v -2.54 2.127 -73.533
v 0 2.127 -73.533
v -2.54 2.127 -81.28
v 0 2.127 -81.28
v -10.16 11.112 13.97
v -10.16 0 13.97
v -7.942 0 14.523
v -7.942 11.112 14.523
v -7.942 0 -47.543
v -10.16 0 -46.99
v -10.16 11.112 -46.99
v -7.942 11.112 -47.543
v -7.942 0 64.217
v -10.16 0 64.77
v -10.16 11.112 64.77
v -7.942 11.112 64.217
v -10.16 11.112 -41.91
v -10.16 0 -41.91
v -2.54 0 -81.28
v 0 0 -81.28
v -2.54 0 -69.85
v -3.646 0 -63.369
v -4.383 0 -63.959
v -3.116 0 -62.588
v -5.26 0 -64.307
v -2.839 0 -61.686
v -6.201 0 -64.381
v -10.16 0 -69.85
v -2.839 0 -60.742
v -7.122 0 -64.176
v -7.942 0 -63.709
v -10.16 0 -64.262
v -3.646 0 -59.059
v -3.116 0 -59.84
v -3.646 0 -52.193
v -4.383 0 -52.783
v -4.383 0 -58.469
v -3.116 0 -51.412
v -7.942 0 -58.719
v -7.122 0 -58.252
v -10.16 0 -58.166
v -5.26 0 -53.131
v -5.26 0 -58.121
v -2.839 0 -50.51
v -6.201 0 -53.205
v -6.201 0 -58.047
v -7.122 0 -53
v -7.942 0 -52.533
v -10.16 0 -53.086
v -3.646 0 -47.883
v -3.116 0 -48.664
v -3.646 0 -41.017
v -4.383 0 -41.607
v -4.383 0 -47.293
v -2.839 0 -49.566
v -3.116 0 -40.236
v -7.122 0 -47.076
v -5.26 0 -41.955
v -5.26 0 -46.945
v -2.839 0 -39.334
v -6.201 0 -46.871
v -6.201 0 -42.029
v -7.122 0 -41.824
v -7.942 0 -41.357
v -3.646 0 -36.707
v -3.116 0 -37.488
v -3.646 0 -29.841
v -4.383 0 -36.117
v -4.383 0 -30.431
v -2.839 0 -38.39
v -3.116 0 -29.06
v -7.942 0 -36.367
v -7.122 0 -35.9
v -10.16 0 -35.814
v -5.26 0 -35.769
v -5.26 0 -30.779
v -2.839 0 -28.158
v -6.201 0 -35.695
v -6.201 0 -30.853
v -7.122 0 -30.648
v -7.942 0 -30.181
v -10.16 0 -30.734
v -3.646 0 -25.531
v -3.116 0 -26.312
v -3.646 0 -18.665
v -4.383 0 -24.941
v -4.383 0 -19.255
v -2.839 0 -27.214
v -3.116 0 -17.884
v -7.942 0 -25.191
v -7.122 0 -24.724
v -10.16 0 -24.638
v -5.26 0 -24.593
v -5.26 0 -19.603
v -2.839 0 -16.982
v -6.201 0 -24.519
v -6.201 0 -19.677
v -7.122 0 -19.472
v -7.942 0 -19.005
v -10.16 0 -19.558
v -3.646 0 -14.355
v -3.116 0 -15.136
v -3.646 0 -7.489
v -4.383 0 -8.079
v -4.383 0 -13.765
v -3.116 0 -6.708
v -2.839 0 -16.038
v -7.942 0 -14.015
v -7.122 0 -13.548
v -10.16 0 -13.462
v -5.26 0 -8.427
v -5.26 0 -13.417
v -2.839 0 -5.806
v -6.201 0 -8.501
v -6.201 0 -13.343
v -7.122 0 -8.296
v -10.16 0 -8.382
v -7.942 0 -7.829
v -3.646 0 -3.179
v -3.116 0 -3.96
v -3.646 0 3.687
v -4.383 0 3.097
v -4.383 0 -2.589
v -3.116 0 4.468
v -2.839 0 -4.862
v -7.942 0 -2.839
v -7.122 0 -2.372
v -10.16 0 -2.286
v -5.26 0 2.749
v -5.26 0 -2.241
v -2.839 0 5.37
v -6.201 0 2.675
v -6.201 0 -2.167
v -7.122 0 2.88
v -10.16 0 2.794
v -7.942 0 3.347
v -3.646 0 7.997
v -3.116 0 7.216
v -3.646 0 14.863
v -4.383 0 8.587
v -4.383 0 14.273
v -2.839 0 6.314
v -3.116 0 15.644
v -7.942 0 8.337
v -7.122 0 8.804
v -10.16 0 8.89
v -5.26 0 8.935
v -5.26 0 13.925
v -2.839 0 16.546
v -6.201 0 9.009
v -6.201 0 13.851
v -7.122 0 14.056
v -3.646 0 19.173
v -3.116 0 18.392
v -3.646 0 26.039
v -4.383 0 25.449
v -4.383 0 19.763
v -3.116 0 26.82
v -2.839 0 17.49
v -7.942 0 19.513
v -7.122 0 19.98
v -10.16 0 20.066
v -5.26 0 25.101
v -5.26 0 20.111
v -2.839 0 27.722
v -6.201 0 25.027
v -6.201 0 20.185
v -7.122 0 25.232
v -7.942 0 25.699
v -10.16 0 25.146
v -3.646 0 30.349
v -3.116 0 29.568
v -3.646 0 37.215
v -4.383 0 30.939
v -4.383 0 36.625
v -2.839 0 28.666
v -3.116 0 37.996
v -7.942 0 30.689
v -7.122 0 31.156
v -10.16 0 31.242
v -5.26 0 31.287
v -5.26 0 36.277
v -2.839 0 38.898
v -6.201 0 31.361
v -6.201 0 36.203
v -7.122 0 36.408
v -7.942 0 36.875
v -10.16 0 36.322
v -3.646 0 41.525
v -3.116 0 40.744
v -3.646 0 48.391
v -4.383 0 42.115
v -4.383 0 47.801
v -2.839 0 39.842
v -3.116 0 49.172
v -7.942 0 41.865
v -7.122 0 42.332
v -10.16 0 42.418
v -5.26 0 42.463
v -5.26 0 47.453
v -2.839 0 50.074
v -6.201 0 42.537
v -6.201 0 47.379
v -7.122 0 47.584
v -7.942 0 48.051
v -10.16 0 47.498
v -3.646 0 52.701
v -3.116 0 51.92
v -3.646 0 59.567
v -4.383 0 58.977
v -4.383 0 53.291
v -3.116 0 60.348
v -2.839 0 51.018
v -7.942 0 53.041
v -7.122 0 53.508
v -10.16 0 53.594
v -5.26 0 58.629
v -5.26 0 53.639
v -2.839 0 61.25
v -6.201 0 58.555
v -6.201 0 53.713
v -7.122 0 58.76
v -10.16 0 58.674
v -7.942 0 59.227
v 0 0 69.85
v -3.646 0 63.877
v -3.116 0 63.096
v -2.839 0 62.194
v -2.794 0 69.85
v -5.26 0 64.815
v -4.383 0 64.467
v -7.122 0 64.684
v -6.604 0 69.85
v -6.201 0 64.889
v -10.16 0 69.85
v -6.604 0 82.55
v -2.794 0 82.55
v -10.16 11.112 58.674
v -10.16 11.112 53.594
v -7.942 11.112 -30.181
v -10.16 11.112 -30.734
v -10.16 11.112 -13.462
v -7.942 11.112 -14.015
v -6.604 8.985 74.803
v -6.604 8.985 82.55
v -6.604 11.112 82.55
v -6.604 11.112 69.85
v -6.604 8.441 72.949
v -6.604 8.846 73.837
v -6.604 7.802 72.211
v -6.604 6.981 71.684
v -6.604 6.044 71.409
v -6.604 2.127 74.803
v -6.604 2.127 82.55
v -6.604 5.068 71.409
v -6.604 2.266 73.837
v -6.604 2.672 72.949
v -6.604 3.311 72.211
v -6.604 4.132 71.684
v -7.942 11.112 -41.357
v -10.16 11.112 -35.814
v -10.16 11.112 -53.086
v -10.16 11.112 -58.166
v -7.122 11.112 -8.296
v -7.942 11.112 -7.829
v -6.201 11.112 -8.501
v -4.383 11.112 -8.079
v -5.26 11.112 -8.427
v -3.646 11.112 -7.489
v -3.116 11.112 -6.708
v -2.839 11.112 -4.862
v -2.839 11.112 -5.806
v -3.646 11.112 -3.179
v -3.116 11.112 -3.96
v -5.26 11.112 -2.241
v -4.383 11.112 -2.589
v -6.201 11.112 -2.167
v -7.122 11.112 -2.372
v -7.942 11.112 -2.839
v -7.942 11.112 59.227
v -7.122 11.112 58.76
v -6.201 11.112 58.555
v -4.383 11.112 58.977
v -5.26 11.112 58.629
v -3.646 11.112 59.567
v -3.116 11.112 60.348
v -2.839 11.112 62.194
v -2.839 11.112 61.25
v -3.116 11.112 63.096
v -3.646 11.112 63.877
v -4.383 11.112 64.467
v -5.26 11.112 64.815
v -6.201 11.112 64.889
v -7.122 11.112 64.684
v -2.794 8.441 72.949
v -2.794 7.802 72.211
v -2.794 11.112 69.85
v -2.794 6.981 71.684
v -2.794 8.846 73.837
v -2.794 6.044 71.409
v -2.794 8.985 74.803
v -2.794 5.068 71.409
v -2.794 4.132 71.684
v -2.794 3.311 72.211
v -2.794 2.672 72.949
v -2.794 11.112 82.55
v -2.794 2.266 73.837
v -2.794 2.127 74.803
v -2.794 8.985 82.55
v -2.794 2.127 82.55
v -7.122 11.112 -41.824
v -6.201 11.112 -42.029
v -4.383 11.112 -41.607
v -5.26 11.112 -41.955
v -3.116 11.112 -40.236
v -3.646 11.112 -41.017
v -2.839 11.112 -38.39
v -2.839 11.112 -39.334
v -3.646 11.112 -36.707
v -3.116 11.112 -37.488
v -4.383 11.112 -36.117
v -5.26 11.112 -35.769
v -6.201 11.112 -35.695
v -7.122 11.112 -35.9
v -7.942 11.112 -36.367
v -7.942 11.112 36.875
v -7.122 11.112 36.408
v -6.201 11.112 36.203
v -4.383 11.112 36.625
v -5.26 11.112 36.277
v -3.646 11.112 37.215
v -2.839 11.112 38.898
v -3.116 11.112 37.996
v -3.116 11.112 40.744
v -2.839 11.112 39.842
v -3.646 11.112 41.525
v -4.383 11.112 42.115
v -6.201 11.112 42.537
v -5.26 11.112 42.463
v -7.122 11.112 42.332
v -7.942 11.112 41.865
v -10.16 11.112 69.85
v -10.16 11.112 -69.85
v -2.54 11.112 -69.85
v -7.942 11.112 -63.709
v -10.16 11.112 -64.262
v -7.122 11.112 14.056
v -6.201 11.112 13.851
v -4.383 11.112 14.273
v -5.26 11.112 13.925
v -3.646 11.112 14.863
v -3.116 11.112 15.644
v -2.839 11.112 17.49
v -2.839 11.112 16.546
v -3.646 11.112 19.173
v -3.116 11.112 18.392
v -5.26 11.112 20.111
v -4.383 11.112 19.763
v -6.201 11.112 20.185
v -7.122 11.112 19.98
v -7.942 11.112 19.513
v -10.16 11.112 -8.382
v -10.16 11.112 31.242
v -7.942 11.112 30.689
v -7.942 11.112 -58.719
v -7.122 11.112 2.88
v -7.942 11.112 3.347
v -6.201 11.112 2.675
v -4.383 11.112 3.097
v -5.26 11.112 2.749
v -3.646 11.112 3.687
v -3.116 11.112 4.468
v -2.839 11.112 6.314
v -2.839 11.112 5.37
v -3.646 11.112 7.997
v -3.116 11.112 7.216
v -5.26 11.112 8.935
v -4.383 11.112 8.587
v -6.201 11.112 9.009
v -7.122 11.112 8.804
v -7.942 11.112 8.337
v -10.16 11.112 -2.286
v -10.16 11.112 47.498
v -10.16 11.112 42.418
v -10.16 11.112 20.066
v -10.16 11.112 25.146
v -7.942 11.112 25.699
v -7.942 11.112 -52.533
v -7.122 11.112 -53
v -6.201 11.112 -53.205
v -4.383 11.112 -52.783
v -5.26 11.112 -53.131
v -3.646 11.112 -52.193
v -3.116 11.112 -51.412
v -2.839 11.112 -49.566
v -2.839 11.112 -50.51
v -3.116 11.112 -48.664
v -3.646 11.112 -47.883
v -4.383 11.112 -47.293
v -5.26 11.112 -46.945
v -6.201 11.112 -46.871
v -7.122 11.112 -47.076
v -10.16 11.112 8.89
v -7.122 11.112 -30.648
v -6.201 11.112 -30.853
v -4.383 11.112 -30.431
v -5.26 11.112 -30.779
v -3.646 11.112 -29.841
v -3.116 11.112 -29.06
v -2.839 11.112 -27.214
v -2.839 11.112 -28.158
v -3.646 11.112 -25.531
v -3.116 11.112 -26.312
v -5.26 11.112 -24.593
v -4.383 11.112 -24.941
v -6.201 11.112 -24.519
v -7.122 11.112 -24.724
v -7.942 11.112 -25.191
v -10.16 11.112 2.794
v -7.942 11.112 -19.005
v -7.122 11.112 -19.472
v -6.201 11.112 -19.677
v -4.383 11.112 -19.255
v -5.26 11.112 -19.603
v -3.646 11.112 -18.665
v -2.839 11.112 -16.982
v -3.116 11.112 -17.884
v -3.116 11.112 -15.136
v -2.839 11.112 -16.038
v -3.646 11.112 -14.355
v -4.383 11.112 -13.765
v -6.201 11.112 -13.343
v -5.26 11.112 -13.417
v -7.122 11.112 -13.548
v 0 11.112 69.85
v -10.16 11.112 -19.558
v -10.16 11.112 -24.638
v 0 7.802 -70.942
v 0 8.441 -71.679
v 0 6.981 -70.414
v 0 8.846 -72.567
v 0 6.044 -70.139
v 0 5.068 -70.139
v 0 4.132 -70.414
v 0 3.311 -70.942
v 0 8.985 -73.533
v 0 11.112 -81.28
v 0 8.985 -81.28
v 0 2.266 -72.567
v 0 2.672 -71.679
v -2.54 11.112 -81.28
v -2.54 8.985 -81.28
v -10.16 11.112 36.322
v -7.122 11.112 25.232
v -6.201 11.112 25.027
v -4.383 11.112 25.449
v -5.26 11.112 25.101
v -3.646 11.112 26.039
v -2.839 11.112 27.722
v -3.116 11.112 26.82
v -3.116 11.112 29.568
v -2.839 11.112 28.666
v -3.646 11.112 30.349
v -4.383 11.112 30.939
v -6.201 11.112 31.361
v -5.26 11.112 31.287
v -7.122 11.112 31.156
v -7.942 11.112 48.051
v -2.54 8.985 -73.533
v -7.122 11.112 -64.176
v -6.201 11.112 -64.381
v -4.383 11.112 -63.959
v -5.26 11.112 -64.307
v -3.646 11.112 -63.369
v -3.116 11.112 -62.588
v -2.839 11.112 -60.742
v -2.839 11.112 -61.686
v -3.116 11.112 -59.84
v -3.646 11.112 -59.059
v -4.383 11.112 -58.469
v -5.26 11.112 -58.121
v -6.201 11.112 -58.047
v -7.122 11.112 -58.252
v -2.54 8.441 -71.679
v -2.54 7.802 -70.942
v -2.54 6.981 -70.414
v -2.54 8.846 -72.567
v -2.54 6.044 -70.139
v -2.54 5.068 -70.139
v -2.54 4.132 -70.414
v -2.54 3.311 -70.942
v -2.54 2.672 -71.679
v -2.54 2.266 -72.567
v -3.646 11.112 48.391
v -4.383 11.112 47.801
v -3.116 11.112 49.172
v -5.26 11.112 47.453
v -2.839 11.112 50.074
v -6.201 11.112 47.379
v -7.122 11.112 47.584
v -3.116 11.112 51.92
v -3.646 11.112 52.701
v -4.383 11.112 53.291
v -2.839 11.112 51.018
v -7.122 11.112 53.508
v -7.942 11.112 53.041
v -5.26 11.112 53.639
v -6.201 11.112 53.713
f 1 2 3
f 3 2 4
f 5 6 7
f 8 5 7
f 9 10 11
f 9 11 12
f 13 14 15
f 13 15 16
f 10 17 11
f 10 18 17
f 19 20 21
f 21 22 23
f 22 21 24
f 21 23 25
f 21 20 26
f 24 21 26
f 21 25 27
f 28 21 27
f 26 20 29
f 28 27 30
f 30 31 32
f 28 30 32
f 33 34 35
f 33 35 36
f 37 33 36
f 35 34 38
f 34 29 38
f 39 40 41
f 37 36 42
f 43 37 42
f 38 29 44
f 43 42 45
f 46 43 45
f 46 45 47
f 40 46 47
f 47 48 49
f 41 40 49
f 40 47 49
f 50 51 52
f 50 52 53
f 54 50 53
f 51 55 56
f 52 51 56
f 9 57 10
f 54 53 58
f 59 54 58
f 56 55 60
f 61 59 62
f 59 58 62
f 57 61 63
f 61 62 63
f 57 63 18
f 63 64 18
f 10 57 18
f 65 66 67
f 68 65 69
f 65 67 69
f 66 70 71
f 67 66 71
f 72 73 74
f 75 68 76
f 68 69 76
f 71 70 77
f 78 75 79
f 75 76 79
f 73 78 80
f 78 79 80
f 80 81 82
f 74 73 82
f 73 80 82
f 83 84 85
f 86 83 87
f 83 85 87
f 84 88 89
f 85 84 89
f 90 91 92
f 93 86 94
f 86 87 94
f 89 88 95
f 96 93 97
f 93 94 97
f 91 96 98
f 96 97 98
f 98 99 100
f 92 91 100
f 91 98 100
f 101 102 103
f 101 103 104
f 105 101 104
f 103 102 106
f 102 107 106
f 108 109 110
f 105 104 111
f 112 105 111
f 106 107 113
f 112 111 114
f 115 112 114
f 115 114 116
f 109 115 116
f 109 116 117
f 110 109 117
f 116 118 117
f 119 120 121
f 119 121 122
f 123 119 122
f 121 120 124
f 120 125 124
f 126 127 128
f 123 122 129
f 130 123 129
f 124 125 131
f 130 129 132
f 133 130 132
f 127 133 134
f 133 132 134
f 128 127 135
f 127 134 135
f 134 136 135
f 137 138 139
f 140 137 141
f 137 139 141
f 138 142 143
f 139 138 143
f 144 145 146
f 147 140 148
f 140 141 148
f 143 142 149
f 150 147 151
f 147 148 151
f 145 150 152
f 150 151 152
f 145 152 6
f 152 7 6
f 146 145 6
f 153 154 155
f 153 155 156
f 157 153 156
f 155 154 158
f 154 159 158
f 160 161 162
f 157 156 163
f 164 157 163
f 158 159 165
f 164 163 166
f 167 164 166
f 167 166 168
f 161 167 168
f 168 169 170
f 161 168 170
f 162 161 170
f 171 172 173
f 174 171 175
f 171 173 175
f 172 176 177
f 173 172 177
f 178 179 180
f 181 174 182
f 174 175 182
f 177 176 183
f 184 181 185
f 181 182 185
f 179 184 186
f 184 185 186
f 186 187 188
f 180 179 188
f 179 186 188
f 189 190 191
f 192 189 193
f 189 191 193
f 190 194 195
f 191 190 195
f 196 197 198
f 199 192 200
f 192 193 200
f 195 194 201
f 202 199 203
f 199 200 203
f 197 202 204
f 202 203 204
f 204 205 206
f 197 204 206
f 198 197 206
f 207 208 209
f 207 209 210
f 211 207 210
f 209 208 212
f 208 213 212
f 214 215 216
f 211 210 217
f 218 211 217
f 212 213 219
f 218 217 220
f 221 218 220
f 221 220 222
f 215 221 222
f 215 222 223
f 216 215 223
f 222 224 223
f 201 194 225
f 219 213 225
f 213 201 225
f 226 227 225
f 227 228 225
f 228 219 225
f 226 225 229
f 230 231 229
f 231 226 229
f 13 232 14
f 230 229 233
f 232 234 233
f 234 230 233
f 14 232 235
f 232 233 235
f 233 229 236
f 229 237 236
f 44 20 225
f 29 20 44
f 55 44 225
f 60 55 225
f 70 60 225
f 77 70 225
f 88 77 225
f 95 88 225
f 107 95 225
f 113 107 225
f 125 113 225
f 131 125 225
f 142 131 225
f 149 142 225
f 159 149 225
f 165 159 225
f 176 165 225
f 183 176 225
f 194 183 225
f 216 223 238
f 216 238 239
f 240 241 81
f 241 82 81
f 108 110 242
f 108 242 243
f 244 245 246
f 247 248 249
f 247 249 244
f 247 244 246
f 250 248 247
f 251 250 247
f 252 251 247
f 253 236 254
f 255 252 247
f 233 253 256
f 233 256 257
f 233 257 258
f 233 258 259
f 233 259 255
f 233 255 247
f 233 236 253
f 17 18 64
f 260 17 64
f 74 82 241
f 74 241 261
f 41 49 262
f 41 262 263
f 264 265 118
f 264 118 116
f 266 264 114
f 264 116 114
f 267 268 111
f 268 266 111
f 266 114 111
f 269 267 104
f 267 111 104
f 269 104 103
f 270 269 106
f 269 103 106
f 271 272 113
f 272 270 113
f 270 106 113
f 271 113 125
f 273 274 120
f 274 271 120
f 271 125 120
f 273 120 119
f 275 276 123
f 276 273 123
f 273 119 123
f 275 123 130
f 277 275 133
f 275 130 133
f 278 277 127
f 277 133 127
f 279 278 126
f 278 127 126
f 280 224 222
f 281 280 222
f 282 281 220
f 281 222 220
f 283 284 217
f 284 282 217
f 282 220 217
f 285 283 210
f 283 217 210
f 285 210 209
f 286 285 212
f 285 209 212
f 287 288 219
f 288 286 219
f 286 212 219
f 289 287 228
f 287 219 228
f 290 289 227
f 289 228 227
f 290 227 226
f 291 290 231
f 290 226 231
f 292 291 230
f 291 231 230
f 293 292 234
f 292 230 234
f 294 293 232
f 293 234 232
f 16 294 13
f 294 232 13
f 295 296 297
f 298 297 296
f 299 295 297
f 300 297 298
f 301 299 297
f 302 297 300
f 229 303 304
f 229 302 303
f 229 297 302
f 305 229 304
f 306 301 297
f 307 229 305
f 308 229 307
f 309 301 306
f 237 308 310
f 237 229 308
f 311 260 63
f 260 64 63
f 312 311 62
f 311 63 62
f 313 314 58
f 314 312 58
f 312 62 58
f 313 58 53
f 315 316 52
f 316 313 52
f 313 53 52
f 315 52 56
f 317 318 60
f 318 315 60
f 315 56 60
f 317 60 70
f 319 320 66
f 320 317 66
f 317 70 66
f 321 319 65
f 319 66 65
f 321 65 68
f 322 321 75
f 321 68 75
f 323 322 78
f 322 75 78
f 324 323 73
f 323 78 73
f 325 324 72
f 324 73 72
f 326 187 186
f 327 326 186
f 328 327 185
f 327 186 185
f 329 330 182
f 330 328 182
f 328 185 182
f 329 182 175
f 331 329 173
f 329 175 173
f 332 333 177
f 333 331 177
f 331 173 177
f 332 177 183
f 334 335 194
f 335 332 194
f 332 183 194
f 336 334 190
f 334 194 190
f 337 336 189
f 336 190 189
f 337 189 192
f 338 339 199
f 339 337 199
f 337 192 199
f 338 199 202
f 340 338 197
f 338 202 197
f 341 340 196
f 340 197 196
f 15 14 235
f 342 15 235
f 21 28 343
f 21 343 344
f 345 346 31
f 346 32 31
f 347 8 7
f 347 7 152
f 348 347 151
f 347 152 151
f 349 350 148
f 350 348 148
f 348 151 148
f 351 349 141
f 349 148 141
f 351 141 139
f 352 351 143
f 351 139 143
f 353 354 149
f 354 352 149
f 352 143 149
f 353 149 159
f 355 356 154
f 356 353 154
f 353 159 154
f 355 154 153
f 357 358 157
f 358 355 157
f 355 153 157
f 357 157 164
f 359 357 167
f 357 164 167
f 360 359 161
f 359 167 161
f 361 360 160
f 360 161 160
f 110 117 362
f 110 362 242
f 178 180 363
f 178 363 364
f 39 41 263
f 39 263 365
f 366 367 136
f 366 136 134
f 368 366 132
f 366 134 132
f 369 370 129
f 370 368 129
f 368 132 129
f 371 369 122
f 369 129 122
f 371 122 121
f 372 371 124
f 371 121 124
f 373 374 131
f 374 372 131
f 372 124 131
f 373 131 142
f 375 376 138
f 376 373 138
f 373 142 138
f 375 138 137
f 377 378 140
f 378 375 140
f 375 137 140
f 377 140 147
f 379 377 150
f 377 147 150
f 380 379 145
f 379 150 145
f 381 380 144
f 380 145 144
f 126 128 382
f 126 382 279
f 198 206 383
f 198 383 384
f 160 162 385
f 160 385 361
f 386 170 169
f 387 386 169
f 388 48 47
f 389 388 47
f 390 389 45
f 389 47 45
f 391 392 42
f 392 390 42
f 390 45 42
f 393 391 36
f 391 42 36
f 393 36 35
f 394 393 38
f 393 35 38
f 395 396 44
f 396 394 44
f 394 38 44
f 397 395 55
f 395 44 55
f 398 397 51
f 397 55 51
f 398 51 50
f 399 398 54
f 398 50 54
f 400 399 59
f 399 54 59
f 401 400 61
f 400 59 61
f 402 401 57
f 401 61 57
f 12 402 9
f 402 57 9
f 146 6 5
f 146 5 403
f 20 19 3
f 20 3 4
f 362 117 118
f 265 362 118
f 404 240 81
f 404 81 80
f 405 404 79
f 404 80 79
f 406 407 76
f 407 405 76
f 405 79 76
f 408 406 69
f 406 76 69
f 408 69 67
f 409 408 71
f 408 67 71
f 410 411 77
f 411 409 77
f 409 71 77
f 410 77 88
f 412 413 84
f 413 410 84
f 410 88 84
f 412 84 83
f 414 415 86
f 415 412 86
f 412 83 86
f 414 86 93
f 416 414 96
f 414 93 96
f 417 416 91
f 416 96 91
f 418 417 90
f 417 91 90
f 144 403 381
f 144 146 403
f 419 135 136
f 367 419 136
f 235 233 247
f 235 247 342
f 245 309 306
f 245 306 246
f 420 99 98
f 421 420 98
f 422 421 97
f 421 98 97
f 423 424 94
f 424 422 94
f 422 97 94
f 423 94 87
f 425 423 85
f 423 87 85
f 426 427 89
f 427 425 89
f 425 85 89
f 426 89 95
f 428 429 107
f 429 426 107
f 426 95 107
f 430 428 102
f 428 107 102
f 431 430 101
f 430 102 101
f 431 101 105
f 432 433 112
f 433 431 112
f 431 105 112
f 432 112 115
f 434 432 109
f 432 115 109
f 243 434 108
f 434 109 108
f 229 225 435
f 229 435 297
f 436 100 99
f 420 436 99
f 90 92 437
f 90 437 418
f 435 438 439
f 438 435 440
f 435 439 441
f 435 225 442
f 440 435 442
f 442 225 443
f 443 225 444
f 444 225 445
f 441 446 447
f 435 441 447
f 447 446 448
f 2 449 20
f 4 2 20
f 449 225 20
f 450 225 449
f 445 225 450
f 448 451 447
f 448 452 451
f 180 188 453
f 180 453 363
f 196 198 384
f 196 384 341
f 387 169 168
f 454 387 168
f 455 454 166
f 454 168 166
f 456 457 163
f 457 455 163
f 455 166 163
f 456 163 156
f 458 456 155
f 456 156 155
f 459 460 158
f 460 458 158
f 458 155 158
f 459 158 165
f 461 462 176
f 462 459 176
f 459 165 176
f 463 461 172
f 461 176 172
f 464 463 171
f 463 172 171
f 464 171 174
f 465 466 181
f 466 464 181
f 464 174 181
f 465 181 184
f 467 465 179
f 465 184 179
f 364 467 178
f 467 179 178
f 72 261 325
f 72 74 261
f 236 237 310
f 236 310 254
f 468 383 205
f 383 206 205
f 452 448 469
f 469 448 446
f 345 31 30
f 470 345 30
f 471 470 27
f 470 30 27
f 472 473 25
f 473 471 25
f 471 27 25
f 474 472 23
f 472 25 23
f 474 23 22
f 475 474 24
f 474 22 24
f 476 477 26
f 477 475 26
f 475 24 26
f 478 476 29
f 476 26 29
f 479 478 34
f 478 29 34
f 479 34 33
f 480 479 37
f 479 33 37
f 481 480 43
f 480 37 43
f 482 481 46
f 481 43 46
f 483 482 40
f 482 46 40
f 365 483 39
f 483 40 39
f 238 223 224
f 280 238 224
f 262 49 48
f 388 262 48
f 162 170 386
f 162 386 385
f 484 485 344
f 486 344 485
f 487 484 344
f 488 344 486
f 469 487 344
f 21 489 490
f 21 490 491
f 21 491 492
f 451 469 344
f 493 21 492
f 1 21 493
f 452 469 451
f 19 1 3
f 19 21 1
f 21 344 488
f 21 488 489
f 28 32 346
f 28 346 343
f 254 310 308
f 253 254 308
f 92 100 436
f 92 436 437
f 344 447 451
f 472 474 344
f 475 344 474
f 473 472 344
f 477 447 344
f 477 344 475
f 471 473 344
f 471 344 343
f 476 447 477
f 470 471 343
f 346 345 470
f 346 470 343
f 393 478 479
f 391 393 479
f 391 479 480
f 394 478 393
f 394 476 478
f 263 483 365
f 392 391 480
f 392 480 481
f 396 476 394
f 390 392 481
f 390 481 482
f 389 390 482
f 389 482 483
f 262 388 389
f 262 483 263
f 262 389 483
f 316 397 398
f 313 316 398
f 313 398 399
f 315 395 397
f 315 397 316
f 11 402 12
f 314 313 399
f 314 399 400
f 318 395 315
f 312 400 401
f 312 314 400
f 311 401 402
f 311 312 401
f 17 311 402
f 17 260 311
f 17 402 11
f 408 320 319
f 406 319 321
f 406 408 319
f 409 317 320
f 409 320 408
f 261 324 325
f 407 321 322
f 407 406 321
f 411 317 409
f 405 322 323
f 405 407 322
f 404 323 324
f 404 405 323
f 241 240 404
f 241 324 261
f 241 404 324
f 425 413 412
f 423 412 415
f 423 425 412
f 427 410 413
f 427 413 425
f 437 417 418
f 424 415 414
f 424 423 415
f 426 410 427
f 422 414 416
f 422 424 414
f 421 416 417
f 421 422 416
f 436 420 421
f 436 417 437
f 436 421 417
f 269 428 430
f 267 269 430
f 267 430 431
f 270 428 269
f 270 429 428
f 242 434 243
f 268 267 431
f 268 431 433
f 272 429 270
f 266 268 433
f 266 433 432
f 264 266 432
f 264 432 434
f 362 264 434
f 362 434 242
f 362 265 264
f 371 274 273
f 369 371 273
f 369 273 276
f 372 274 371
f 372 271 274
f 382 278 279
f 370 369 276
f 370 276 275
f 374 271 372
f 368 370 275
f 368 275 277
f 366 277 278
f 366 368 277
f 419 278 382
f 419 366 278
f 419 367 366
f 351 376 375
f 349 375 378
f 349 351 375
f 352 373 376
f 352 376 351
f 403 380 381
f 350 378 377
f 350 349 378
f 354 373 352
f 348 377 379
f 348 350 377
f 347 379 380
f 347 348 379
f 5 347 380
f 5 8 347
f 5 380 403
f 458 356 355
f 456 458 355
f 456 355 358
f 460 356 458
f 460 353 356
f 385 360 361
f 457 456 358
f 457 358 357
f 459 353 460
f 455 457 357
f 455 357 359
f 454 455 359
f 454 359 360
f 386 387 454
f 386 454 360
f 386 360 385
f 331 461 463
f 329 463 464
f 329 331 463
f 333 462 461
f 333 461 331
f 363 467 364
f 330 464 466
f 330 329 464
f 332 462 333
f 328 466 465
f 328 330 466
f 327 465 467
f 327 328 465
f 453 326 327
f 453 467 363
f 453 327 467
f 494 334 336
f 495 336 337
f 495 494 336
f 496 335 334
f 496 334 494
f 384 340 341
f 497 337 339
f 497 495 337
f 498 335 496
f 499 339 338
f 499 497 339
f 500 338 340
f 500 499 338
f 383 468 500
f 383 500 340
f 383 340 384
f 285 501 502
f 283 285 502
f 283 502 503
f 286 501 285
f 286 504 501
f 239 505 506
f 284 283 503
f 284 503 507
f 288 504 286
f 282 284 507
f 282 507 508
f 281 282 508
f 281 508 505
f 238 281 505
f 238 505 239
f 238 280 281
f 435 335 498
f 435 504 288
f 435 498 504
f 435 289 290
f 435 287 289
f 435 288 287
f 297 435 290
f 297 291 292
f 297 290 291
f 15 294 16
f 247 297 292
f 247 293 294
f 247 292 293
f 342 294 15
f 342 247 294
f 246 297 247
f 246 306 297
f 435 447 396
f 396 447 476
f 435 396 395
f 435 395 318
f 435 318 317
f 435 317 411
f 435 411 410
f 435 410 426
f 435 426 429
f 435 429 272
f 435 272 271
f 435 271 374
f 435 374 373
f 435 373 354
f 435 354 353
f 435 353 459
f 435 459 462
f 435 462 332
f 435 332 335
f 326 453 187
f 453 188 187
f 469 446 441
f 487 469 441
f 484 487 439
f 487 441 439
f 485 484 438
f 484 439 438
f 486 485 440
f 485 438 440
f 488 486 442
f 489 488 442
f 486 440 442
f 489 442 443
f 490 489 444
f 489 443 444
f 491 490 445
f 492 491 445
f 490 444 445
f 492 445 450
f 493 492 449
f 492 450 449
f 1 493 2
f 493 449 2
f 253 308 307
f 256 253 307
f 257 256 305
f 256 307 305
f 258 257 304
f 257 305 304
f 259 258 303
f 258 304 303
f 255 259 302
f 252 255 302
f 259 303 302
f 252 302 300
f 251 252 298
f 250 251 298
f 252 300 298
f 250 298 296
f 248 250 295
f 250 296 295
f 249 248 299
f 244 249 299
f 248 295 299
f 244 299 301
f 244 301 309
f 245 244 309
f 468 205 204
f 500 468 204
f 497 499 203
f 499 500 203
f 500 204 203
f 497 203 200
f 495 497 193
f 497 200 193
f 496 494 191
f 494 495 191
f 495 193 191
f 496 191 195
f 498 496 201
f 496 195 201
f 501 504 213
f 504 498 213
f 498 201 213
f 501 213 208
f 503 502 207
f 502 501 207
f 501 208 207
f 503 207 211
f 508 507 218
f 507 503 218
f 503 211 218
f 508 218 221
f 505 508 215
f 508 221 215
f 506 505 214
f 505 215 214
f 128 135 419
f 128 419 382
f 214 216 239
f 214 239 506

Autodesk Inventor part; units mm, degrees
ref_plane "YZ Plane" through (0, 0, 0) normal (1, 0, 0) x (0, 1, 0)
ref_plane "XZ Plane" through (0, 0, 0) normal (0, 1, 0) x (-1, 0, 0)
ref_plane "XY Plane" through (0, 0, 0) normal (0, 0, 1) x (1, 0, 0)
sketch "Sketch1" plane through (0, 0, 0) normal (0, 1, 0) x (-1, 0, 0)
  line L0 (0, 69.85) -> (0, -69.85)
  line L1 (2.54, 69.85) -> (10.16, 69.85)
  line L2 (10.16, 67.31) -> (10.16, 64.77)
  line L3 (10.16, 64.77) -> (7.9419, 64.217)
  line L4 (10.16, 58.674) -> (7.9419, 59.227)
  arc A0 (7.9419, 64.217) -> (7.9419, 59.227) centre (5.9783, 61.722) ccw
  line L5 (0, 69.85) -> (2.54, 69.85)
  line L6 (6.604, 69.85) -> (2.794, 69.85)
  line L7 (2.794, 69.85) -> (2.794, 82.55)
  line L8 (2.794, 82.55) -> (6.604, 82.55)
  line L9 (6.604, 82.55) -> (6.604, 69.85)
  line L10 (2.54, -69.85) -> (2.54, -81.28)
  line L11 (2.54, -81.28) -> (0, -81.28)
  line L12 (0, -81.28) -> (0, -69.85)
  line L13 (5.9783, 61.722) -> (7.9419, 61.722) construction
  line L14 (7.9419, 61.722) -> (7.9419, 59.227) construction
  line L15 (7.9419, 61.722) -> (7.9419, 64.217) construction
  line L16 (10.16, 67.31) -> (10.16, 69.85)
  line L17 (10.16, -66.802) -> (10.16, -69.85)
  line L18 (10.16, -69.85) -> (2.54, -69.85)
  line L19 (10.16, 58.674) -> (10.16, 56.134)
  line L20 (10.16, 56.134) -> (10.16, 53.594)
  line L21 (10.16, 53.594) -> (7.9419, 53.041)
  line L22 (7.9419, 50.546) -> (7.9419, 53.041) construction
  arc A1 (7.9419, 53.041) -> (7.9419, 48.051) centre (5.9783, 50.546) ccw
  line L23 (7.9419, 50.546) -> (7.9419, 48.051) construction
  line L24 (10.16, 47.498) -> (7.9419, 48.051)
  line L25 (10.16, 47.498) -> (10.16, 44.958)
  line L26 (5.9783, 50.546) -> (7.9419, 50.546) construction
  line L27 (10.16, 44.958) -> (10.16, 42.418)
  line L28 (10.16, 42.418) -> (7.9419, 41.865)
  line L29 (7.9419, 39.37) -> (7.9419, 41.865) construction
  arc A2 (7.9419, 41.865) -> (7.9419, 36.875) centre (5.9783, 39.37) ccw
  line L30 (7.9419, 39.37) -> (7.9419, 36.875) construction
  line L31 (10.16, 36.322) -> (7.9419, 36.875)
  line L32 (10.16, 36.322) -> (10.16, 33.782)
  line L33 (5.9783, 39.37) -> (7.9419, 39.37) construction
  line L34 (10.16, 33.782) -> (10.16, 31.242)
  line L35 (10.16, 31.242) -> (7.9419, 30.689)
  line L36 (7.9419, 28.194) -> (7.9419, 30.689) construction
  arc A3 (7.9419, 30.689) -> (7.9419, 25.699) centre (5.9783, 28.194) ccw
  line L37 (7.9419, 28.194) -> (7.9419, 25.699) construction
  line L38 (10.16, 25.146) -> (7.9419, 25.699)
  line L39 (10.16, 25.146) -> (10.16, 22.606)
  line L40 (5.9783, 28.194) -> (7.9419, 28.194) construction
  line L41 (10.16, 22.606) -> (10.16, 20.066)
  line L42 (10.16, 20.066) -> (7.9419, 19.513)
  line L43 (7.9419, 17.018) -> (7.9419, 19.513) construction
  arc A4 (7.9419, 19.513) -> (7.9419, 14.523) centre (5.9783, 17.018) ccw
  line L44 (7.9419, 17.018) -> (7.9419, 14.523) construction
  line L45 (10.16, 13.97) -> (7.9419, 14.523)
  line L46 (10.16, 13.97) -> (10.16, 11.43)
  line L47 (5.9783, 17.018) -> (7.9419, 17.018) construction
  line L48 (10.16, 11.43) -> (10.16, 8.89)
  line L49 (10.16, 8.89) -> (7.9419, 8.337)
  line L50 (7.9419, 5.842) -> (7.9419, 8.337) construction
  arc A5 (7.9419, 8.337) -> (7.9419, 3.347) centre (5.9783, 5.842) ccw
  line L51 (7.9419, 5.842) -> (7.9419, 3.347) construction
  line L52 (10.16, 2.794) -> (7.9419, 3.347)
  line L53 (10.16, 2.794) -> (10.16, 0.254)
  line L54 (5.9783, 5.842) -> (7.9419, 5.842) construction
  line L55 (10.16, 0.254) -> (10.16, -2.286)
  line L56 (10.16, -2.286) -> (7.9419, -2.839)
  line L57 (7.9419, -5.334) -> (7.9419, -2.839) construction
  arc A6 (7.9419, -2.839) -> (7.9419, -7.829) centre (5.9783, -5.334) ccw
  line L58 (7.9419, -5.334) -> (7.9419, -7.829) construction
  line L59 (10.16, -8.382) -> (7.9419, -7.829)
  line L60 (10.16, -8.382) -> (10.16, -10.922)
  line L61 (5.9783, -5.334) -> (7.9419, -5.334) construction
  line L62 (10.16, -10.922) -> (10.16, -13.462)
  line L63 (10.16, -13.462) -> (7.9419, -14.015)
  line L64 (7.9419, -16.51) -> (7.9419, -14.015) construction
  arc A7 (7.9419, -14.015) -> (7.9419, -19.005) centre (5.9783, -16.51) ccw
  line L65 (7.9419, -16.51) -> (7.9419, -19.005) construction
  line L66 (10.16, -19.558) -> (7.9419, -19.005)
  line L67 (10.16, -19.558) -> (10.16, -22.098)
  line L68 (5.9783, -16.51) -> (7.9419, -16.51) construction
  line L69 (10.16, -22.098) -> (10.16, -24.638)
  line L70 (10.16, -24.638) -> (7.9419, -25.191)
  line L71 (7.9419, -27.686) -> (7.9419, -25.191) construction
  arc A8 (7.9419, -25.191) -> (7.9419, -30.181) centre (5.9783, -27.686) ccw
  line L72 (7.9419, -27.686) -> (7.9419, -30.181) construction
  line L73 (10.16, -30.734) -> (7.9419, -30.181)
  line L74 (10.16, -30.734) -> (10.16, -33.274)
  line L75 (5.9783, -27.686) -> (7.9419, -27.686) construction
  line L76 (10.16, -33.274) -> (10.16, -35.814)
  line L77 (10.16, -35.814) -> (7.9419, -36.367)
  line L78 (7.9419, -38.862) -> (7.9419, -36.367) construction
  arc A9 (7.9419, -36.367) -> (7.9419, -41.357) centre (5.9783, -38.862) ccw
  line L79 (7.9419, -38.862) -> (7.9419, -41.357) construction
  line L80 (10.16, -41.91) -> (7.9419, -41.357)
  line L81 (10.16, -41.91) -> (10.16, -44.45)
  line L82 (5.9783, -38.862) -> (7.9419, -38.862) construction
  line L83 (10.16, -44.45) -> (10.16, -46.99)
  line L84 (10.16, -46.99) -> (7.9419, -47.543)
  line L85 (7.9419, -50.038) -> (7.9419, -47.543) construction
  arc A10 (7.9419, -47.543) -> (7.9419, -52.533) centre (5.9783, -50.038) ccw
  line L86 (7.9419, -50.038) -> (7.9419, -52.533) construction
  line L87 (10.16, -53.086) -> (7.9419, -52.533)
  line L88 (10.16, -53.086) -> (10.16, -55.626)
  line L89 (5.9783, -50.038) -> (7.9419, -50.038) construction
  line L90 (10.16, -55.626) -> (10.16, -58.166)
  line L91 (10.16, -58.166) -> (7.9419, -58.719)
  line L92 (7.9419, -61.214) -> (7.9419, -58.719) construction
  arc A11 (7.9419, -58.719) -> (7.9419, -63.709) centre (5.9783, -61.214) ccw
  line L93 (7.9419, -61.214) -> (7.9419, -63.709) construction
  line L94 (10.16, -64.262) -> (7.9419, -63.709)
  line L95 (10.16, -64.262) -> (10.16, -66.802)
  line L96 (5.9783, -61.214) -> (7.9419, -61.214) construction
  point P0 (0, 0)
  point P1 (2.794, 69.85)
  dimension "d1" = 7.62
  dimension "d5" = 104
  dimension "d7" = 3.175
  dimension "d8" = 2.286
  dimension "d12" = 2.54
  dimension "d27" = 12.7
  dimension "d28" = 3.81
  dimension "d29" = 2.794
  dimension "d66" = 139.7
  dimension "d67" = 69.85
  dimension "d76" = 10.16
  dimension "d77" = 2.54
  dimension "d87" = 11.43
  dimension "d88" = 2.54
  dimension "d89" = 4.9899
  dimension "d90" = 2.54
  dimension "d91" = 11.176
  dimension "d94" = 11.176
extrude "Extrusion1" add sketch "Sketch1" along normal blind 11.1125
sketch "Sketch3" plane through (0, 0, 69.85) normal (1, 0, 0) x (0, 0, -1)
  line L0 (158.877, 5.5563) -> (143.383, 5.5562) construction
  line L1 (158.877, 8.9853) -> (143.383, 8.9852)
  line L2 (143.383, 2.1272) -> (158.877, 2.1273)
  arc A0 (158.877, 2.1273) -> (158.877, 8.9853) centre (158.877, 5.5563) ccw
  arc A1 (143.383, 8.9852) -> (143.383, 2.1272) centre (143.383, 5.5562) ccw
  line L3 (151.13, 0) -> (151.13, 11.1125) projected
  line L4 (0, 11.1125) -> (151.13, 11.1125) projected
  line L5 (-20.447, 5.5563) -> (-4.953, 5.5563) construction
  line L6 (-20.447, 2.1273) -> (-4.953, 2.1272)
  line L7 (-4.953, 8.9853) -> (-20.447, 8.9853)
  arc A2 (-20.447, 8.9853) -> (-20.447, 2.1273) centre (-20.447, 5.5563) ccw
  arc A3 (-4.953, 2.1272) -> (-4.953, 8.9853) centre (-4.953, 5.5563) ccw
  line L8 (-12.7, 0) -> (-12.7, 11.1125) projected
  point P0 (69.85, 0)
  point P1 (151.13, 5.5563)
  point P2 (-12.7, 5.5563)
  point P3 (-12.7, 8.9853)
  point P4 (-12.7, 2.1272)
  point P5 (151.13, 2.1272)
  point P6 (151.13, 8.9853)
  dimension "d45" = 11.1125
  dimension "d46" = 5.5563
  dimension "d47" = 7.747
  dimension "d48" = 7.747
  dimension "d49" = 6.858
  dimension "d50" = 6.858
extrude "Extrusion2" cut sketch "Sketch3" against normal through all contours L3 L2 A1 L1 | L8 L7 A3 L6
properties part number "Hose Clamp V4" material "ABS Plastic"
